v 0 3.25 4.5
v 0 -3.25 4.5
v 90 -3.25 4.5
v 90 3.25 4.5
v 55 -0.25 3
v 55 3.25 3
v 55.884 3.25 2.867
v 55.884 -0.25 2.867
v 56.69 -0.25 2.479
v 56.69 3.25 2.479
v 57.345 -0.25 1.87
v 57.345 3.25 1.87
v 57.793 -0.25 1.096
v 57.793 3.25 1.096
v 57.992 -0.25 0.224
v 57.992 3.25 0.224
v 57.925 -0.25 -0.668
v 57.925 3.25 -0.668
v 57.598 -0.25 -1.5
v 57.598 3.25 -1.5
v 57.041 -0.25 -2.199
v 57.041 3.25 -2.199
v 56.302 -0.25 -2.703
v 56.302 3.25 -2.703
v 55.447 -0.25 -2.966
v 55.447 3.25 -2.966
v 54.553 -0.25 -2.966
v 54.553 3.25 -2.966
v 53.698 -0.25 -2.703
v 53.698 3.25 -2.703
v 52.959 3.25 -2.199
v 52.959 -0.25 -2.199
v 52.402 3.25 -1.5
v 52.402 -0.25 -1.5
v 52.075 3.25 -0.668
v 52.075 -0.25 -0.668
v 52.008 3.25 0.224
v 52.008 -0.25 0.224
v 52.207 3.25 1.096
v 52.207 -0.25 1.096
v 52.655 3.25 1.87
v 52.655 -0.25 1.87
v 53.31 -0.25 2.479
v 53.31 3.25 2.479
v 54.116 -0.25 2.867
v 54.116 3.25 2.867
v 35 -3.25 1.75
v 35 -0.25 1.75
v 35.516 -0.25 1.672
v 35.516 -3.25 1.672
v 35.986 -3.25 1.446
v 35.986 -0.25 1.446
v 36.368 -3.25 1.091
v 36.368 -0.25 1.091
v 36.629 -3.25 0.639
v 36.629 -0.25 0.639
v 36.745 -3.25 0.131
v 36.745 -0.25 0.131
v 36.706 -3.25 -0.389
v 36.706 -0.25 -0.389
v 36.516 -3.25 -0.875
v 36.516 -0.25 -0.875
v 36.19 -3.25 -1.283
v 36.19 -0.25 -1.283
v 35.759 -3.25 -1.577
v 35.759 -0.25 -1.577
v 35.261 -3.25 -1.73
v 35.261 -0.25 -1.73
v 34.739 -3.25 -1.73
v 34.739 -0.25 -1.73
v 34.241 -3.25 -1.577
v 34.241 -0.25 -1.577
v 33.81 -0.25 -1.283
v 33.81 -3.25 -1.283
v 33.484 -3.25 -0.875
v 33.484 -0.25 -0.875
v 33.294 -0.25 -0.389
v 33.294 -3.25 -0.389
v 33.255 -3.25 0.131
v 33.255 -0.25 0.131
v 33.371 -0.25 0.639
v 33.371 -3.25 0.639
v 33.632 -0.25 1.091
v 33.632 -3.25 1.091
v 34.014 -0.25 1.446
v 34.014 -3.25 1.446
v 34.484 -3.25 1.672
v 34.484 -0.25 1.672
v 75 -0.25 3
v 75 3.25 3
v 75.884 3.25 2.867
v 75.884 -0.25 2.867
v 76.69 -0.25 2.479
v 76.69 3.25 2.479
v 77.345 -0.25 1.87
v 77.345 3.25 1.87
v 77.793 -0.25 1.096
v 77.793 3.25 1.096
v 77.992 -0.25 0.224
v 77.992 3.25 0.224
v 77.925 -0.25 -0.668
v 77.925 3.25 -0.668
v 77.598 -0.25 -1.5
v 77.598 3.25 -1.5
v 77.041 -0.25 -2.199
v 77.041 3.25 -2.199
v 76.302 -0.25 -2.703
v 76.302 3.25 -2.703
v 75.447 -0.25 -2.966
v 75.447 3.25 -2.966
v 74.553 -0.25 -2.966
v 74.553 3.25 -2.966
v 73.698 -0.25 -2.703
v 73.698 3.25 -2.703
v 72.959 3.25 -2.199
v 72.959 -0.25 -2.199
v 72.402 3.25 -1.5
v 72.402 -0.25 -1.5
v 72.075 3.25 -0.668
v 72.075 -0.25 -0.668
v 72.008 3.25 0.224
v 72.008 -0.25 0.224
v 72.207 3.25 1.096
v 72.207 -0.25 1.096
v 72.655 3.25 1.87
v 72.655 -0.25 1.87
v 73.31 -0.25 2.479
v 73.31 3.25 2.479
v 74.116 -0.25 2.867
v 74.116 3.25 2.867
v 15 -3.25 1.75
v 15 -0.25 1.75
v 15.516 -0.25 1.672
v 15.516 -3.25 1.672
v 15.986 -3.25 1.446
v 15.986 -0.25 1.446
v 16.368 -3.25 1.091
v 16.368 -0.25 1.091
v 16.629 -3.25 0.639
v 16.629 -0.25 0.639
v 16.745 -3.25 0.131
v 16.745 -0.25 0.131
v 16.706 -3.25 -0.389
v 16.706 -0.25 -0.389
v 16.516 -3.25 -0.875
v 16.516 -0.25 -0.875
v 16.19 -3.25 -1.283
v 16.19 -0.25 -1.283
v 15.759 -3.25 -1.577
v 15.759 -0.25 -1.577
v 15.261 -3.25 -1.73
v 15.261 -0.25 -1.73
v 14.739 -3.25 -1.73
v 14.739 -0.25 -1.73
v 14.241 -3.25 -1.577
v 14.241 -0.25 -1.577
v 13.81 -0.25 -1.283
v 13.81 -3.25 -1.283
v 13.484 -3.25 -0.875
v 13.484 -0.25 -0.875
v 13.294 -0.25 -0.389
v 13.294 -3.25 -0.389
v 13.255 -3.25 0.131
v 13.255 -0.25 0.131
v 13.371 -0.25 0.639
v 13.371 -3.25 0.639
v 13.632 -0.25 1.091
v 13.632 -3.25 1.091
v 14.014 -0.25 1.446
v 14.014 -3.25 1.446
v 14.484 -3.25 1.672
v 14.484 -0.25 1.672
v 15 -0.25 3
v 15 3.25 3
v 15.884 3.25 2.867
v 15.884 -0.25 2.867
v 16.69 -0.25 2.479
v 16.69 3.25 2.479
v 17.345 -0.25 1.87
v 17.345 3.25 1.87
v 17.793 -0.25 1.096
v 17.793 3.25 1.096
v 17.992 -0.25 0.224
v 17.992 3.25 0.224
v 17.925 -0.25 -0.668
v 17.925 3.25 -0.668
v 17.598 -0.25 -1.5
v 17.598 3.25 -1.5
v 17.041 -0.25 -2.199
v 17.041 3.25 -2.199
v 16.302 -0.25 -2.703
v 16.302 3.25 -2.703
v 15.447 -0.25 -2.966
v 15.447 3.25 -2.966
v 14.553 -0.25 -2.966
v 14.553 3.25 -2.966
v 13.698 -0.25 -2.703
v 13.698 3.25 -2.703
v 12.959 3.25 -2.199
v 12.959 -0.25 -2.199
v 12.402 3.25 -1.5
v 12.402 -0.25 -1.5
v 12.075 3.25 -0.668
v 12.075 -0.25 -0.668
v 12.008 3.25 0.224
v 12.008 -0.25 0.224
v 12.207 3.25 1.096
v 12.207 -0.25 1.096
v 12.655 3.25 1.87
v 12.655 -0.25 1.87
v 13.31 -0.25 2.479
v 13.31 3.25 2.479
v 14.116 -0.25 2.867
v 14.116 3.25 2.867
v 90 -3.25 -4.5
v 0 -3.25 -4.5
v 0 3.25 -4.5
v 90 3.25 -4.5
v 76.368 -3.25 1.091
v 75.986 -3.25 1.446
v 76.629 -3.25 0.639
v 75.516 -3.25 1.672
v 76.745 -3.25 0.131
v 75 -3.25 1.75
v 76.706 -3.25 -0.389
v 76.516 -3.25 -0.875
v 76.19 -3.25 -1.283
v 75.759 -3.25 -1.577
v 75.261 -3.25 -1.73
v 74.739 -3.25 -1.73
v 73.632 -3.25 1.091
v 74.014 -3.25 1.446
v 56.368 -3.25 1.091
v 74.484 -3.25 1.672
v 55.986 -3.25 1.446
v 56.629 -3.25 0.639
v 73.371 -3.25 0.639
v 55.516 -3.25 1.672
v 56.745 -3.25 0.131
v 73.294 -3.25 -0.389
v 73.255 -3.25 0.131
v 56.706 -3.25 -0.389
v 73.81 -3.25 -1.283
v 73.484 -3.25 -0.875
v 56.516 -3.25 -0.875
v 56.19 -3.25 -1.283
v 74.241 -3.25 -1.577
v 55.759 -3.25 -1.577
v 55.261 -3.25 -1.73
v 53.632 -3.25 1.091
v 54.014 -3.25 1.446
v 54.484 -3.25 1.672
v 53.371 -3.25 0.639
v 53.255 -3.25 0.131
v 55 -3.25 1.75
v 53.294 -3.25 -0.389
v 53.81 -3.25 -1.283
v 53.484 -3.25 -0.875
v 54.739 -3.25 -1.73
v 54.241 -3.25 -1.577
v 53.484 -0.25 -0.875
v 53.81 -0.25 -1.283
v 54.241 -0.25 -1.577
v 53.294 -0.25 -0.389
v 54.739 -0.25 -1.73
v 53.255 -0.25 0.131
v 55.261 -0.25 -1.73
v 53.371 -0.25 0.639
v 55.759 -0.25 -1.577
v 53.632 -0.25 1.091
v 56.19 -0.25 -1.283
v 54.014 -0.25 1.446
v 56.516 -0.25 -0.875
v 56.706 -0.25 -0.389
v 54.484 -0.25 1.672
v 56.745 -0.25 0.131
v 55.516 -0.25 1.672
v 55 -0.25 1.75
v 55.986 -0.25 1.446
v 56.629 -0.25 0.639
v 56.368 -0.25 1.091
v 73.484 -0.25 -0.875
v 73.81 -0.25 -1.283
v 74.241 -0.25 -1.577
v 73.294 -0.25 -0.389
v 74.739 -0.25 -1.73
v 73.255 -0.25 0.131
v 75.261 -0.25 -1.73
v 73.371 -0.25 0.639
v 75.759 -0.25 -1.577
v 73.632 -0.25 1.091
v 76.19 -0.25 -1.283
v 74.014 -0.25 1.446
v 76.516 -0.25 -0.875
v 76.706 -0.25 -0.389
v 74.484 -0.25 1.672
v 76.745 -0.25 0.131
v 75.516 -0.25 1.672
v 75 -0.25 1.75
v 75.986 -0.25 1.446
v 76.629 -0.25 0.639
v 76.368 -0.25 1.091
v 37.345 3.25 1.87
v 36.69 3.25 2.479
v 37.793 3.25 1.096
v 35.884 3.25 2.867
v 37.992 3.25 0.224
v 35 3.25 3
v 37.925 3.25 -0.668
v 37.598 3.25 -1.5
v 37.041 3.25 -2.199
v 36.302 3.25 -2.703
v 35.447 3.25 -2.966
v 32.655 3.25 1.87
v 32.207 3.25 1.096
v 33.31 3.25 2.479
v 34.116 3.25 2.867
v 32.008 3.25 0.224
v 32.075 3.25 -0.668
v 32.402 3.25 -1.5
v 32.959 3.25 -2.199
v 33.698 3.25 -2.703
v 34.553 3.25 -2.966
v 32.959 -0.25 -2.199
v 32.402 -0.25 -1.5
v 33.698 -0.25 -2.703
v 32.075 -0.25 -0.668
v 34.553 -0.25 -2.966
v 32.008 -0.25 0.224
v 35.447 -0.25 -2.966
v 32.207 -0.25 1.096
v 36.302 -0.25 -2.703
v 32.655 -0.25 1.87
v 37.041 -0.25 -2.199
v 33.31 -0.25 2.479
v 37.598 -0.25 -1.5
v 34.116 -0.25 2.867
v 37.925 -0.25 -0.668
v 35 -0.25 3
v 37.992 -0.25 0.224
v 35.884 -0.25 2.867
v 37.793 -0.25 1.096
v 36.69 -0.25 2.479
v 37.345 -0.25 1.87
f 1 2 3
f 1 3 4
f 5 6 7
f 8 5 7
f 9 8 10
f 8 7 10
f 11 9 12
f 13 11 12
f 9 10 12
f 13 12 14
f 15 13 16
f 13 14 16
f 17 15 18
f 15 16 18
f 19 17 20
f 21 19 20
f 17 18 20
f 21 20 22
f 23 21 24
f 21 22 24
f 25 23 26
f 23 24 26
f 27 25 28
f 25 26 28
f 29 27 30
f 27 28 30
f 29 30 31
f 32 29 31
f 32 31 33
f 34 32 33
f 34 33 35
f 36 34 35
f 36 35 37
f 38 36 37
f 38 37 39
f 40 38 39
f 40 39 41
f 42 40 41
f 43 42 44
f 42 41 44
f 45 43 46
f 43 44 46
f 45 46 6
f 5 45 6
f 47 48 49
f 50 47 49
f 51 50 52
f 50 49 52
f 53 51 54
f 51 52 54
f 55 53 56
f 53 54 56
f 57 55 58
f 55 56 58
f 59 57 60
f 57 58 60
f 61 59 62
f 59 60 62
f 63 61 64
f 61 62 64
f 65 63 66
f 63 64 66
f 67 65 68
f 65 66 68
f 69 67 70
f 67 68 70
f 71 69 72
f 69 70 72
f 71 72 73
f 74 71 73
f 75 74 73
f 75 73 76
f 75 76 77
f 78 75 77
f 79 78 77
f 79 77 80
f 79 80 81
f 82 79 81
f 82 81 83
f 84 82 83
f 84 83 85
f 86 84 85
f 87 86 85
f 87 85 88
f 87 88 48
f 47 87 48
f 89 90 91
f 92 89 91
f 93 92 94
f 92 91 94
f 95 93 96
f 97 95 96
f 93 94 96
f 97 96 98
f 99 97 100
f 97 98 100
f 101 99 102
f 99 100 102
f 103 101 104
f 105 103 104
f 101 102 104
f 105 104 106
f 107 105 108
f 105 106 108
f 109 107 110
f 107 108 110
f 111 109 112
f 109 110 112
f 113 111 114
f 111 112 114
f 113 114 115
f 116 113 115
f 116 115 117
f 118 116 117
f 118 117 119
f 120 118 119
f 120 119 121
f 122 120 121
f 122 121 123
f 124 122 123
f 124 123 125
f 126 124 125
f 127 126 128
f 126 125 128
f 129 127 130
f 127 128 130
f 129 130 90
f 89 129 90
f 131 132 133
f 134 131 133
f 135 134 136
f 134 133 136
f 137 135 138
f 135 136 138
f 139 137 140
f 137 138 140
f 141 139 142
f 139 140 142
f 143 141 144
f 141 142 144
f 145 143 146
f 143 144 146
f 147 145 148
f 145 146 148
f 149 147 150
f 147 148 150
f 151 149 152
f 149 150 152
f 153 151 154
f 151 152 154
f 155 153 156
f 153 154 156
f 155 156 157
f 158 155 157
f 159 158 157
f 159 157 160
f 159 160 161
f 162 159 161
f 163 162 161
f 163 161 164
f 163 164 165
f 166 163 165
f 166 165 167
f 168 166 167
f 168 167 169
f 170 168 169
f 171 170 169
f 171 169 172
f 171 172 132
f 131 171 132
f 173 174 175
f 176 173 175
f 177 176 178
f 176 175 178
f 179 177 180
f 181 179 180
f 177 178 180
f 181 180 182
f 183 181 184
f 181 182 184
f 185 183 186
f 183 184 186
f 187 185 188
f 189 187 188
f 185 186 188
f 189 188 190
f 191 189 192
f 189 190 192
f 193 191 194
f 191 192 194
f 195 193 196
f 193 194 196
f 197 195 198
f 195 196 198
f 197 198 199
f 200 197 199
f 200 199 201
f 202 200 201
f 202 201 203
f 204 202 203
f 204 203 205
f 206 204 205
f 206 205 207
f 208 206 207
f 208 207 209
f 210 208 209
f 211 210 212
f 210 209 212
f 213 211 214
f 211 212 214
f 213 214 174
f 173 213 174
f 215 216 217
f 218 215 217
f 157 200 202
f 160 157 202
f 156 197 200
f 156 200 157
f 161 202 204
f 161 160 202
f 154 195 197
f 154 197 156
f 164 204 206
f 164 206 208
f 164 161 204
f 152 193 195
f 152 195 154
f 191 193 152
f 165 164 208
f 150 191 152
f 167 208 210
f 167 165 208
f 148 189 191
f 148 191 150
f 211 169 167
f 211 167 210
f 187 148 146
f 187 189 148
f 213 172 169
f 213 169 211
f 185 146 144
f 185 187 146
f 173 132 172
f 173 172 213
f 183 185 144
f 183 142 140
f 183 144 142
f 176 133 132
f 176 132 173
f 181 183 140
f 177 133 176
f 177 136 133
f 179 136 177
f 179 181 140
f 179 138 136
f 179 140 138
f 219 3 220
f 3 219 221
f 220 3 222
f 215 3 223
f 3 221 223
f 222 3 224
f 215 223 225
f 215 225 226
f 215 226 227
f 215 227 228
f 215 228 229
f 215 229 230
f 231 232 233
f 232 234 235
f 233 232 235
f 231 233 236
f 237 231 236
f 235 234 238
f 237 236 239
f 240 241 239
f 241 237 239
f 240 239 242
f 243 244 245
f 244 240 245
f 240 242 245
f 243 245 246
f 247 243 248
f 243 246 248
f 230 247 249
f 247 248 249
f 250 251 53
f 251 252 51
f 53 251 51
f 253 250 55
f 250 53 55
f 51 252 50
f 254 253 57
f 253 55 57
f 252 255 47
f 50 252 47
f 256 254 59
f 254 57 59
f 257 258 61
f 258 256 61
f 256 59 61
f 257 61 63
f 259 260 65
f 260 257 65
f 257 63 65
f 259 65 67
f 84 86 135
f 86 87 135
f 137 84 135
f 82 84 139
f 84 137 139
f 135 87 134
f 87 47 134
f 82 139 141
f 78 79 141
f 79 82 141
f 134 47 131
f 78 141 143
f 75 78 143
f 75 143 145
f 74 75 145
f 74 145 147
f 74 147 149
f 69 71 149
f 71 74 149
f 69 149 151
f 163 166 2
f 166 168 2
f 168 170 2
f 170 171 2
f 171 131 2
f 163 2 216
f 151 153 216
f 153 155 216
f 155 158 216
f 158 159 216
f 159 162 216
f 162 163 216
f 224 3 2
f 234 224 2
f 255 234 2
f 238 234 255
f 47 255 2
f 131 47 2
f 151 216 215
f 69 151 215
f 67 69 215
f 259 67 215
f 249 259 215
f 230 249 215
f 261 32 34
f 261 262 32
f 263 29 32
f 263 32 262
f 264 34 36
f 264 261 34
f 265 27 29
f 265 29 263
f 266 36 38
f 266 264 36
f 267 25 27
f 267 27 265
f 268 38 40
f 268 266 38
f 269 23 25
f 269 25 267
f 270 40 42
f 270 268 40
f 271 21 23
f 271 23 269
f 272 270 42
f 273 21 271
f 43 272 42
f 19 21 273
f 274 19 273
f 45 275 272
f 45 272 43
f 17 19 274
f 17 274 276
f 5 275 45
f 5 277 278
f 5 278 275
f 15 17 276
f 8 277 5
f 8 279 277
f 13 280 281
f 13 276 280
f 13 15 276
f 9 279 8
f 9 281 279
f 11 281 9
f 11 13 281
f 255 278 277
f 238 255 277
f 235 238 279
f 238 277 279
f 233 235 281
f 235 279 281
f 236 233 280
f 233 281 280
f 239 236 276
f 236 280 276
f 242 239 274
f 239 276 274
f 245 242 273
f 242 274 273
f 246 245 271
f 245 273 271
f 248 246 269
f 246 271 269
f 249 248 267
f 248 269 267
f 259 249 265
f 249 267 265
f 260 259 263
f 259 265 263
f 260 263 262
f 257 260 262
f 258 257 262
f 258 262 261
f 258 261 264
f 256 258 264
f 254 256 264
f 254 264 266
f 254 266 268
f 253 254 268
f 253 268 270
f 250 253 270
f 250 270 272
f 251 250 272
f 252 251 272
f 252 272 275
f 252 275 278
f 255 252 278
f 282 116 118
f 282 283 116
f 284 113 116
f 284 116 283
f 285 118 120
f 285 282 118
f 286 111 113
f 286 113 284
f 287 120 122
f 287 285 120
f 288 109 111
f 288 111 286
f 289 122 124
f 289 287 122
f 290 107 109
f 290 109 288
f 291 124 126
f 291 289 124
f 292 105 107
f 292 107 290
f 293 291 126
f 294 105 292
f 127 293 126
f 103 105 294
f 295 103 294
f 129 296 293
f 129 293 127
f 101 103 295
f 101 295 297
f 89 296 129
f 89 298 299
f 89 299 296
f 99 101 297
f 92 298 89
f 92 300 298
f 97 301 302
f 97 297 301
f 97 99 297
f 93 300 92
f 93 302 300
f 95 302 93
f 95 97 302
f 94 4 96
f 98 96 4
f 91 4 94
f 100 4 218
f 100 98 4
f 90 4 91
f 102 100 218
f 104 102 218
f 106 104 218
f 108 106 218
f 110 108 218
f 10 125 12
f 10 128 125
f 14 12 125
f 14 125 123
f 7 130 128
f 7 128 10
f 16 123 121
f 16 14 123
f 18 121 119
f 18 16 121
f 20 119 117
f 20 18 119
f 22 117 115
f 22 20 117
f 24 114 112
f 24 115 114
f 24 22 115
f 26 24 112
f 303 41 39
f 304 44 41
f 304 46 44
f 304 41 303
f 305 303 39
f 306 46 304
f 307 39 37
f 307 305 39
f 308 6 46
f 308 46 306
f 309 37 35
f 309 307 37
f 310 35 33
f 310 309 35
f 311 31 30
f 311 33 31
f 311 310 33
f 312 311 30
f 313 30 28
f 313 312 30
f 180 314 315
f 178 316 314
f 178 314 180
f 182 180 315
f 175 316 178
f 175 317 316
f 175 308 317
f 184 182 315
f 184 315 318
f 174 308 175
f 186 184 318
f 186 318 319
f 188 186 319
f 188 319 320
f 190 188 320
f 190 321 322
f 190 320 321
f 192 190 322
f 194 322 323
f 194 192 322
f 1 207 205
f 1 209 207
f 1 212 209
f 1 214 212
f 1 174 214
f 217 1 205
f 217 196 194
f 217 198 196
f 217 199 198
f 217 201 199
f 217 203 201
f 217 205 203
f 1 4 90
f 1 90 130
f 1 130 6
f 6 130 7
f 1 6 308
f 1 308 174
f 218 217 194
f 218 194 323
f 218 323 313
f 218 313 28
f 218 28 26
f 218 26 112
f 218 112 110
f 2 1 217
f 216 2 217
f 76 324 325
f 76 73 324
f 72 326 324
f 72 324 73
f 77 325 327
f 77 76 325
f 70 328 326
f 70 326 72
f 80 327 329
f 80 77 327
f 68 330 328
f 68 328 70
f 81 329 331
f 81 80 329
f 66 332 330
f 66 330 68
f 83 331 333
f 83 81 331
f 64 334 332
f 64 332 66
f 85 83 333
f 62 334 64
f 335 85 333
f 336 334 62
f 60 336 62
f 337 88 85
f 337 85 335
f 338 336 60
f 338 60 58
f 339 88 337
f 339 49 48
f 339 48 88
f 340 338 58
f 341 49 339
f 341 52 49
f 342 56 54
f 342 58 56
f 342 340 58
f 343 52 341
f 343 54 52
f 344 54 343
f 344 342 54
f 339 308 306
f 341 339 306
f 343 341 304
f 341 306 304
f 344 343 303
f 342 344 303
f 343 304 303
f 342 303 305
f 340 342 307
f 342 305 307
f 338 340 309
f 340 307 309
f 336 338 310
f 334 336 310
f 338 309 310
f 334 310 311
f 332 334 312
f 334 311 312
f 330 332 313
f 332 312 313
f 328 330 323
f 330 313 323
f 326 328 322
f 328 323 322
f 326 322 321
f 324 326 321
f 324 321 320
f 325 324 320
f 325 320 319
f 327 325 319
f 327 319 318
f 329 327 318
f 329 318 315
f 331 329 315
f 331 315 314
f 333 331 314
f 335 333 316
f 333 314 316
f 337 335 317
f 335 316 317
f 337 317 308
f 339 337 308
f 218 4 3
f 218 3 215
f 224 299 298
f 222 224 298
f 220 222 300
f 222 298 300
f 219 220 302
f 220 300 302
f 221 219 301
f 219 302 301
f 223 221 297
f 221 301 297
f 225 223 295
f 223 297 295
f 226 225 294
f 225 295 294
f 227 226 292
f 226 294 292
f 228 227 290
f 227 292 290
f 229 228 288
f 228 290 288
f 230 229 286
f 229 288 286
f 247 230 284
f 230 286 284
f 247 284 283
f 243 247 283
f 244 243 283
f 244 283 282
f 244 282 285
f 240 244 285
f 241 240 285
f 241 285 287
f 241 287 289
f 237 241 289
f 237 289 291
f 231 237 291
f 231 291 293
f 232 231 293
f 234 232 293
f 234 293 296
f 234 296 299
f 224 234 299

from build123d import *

# Parameters (mm, degrees)
SKETCH_2_W          = 9
SKETCH_2_H          = 6.5
EXTRUDE_1_DEPTH     = 90
SKETCH_3_R          = 3
CUT_EXTRUDE_1_DEPTH = 3.5
SKETCH_4_R          = 1.75
CUT_EXTRUDE_2_DEPTH = 91.346554998


with BuildPart() as part:
    # 草图2 → 凸台-拉伸1 (new body)
    with BuildSketch(Plane(origin=(0, 0, 0), x_dir=(0, 0, -1), z_dir=(1, 0, 0))):
        Rectangle(SKETCH_2_W, SKETCH_2_H)
    extrude(amount=EXTRUDE_1_DEPTH)

    # 草图3 → 切除-拉伸1 (cut)
    with BuildSketch(Plane(origin=(0, 3.25, 0), x_dir=(1, 0, 0), z_dir=(0, 1, 0))):
        with Locations(Location((15, 0, 0), (0, 0, 270))):
            Circle(SKETCH_3_R)
        with Locations(Location((35, 0, 0), (0, 0, 270))):
            Circle(SKETCH_3_R)
        with Locations(Location((55, 0, 0), (0, 0, 270))):
            Circle(SKETCH_3_R)
        with Locations(Location((75, 0, 0), (0, 0, 270))):
            Circle(SKETCH_3_R)
        with Locations((95, 0)):
            Circle(SKETCH_3_R)
        with Locations((115, 0)):
            Circle(SKETCH_3_R)
        with Locations((135, 0)):
            Circle(SKETCH_3_R)
        with Locations((155, 0)):
            Circle(SKETCH_3_R)
        with Locations((175, 0)):
            Circle(SKETCH_3_R)
        with Locations((195, 0)):
            Circle(SKETCH_3_R)
        with Locations((215, 0)):
            Circle(SKETCH_3_R)
        with Locations((235, 0)):
            Circle(SKETCH_3_R)
        with Locations((255, 0)):
            Circle(SKETCH_3_R)
    extrude(amount=-CUT_EXTRUDE_1_DEPTH, mode=Mode.SUBTRACT)

    # 草图4 → 切除-拉伸2 (cut, through all)
    with BuildSketch(Plane(origin=(0, 3.25, 0), x_dir=(1, 0, 0), z_dir=(0, 1, 0))):
        with Locations(Location((15, 0, 0), (0, 0, 270))):
            Circle(SKETCH_4_R)
        with Locations(Location((35, 0, 0), (0, 0, 270))):
            Circle(SKETCH_4_R)
        with Locations(Location((55, 0, 0), (0, 0, 270))):
            Circle(SKETCH_4_R)
        with Locations(Location((75, 0, 0), (0, 0, 270))):
            Circle(SKETCH_4_R)
        with Locations((95, 0)):
            Circle(SKETCH_4_R)
        with Locations((115, 0)):
            Circle(SKETCH_4_R)
        with Locations((135, 0)):
            Circle(SKETCH_4_R)
        with Locations((155, 0)):
            Circle(SKETCH_4_R)
        with Locations((175, 0)):
            Circle(SKETCH_4_R)
        with Locations((195, 0)):
            Circle(SKETCH_4_R)
        with Locations((215, 0)):
            Circle(SKETCH_4_R)
        with Locations((235, 0)):
            Circle(SKETCH_4_R)
        with Locations((255, 0)):
            Circle(SKETCH_4_R)
    extrude(amount=-CUT_EXTRUDE_2_DEPTH, mode=Mode.SUBTRACT)


solid = part.part
